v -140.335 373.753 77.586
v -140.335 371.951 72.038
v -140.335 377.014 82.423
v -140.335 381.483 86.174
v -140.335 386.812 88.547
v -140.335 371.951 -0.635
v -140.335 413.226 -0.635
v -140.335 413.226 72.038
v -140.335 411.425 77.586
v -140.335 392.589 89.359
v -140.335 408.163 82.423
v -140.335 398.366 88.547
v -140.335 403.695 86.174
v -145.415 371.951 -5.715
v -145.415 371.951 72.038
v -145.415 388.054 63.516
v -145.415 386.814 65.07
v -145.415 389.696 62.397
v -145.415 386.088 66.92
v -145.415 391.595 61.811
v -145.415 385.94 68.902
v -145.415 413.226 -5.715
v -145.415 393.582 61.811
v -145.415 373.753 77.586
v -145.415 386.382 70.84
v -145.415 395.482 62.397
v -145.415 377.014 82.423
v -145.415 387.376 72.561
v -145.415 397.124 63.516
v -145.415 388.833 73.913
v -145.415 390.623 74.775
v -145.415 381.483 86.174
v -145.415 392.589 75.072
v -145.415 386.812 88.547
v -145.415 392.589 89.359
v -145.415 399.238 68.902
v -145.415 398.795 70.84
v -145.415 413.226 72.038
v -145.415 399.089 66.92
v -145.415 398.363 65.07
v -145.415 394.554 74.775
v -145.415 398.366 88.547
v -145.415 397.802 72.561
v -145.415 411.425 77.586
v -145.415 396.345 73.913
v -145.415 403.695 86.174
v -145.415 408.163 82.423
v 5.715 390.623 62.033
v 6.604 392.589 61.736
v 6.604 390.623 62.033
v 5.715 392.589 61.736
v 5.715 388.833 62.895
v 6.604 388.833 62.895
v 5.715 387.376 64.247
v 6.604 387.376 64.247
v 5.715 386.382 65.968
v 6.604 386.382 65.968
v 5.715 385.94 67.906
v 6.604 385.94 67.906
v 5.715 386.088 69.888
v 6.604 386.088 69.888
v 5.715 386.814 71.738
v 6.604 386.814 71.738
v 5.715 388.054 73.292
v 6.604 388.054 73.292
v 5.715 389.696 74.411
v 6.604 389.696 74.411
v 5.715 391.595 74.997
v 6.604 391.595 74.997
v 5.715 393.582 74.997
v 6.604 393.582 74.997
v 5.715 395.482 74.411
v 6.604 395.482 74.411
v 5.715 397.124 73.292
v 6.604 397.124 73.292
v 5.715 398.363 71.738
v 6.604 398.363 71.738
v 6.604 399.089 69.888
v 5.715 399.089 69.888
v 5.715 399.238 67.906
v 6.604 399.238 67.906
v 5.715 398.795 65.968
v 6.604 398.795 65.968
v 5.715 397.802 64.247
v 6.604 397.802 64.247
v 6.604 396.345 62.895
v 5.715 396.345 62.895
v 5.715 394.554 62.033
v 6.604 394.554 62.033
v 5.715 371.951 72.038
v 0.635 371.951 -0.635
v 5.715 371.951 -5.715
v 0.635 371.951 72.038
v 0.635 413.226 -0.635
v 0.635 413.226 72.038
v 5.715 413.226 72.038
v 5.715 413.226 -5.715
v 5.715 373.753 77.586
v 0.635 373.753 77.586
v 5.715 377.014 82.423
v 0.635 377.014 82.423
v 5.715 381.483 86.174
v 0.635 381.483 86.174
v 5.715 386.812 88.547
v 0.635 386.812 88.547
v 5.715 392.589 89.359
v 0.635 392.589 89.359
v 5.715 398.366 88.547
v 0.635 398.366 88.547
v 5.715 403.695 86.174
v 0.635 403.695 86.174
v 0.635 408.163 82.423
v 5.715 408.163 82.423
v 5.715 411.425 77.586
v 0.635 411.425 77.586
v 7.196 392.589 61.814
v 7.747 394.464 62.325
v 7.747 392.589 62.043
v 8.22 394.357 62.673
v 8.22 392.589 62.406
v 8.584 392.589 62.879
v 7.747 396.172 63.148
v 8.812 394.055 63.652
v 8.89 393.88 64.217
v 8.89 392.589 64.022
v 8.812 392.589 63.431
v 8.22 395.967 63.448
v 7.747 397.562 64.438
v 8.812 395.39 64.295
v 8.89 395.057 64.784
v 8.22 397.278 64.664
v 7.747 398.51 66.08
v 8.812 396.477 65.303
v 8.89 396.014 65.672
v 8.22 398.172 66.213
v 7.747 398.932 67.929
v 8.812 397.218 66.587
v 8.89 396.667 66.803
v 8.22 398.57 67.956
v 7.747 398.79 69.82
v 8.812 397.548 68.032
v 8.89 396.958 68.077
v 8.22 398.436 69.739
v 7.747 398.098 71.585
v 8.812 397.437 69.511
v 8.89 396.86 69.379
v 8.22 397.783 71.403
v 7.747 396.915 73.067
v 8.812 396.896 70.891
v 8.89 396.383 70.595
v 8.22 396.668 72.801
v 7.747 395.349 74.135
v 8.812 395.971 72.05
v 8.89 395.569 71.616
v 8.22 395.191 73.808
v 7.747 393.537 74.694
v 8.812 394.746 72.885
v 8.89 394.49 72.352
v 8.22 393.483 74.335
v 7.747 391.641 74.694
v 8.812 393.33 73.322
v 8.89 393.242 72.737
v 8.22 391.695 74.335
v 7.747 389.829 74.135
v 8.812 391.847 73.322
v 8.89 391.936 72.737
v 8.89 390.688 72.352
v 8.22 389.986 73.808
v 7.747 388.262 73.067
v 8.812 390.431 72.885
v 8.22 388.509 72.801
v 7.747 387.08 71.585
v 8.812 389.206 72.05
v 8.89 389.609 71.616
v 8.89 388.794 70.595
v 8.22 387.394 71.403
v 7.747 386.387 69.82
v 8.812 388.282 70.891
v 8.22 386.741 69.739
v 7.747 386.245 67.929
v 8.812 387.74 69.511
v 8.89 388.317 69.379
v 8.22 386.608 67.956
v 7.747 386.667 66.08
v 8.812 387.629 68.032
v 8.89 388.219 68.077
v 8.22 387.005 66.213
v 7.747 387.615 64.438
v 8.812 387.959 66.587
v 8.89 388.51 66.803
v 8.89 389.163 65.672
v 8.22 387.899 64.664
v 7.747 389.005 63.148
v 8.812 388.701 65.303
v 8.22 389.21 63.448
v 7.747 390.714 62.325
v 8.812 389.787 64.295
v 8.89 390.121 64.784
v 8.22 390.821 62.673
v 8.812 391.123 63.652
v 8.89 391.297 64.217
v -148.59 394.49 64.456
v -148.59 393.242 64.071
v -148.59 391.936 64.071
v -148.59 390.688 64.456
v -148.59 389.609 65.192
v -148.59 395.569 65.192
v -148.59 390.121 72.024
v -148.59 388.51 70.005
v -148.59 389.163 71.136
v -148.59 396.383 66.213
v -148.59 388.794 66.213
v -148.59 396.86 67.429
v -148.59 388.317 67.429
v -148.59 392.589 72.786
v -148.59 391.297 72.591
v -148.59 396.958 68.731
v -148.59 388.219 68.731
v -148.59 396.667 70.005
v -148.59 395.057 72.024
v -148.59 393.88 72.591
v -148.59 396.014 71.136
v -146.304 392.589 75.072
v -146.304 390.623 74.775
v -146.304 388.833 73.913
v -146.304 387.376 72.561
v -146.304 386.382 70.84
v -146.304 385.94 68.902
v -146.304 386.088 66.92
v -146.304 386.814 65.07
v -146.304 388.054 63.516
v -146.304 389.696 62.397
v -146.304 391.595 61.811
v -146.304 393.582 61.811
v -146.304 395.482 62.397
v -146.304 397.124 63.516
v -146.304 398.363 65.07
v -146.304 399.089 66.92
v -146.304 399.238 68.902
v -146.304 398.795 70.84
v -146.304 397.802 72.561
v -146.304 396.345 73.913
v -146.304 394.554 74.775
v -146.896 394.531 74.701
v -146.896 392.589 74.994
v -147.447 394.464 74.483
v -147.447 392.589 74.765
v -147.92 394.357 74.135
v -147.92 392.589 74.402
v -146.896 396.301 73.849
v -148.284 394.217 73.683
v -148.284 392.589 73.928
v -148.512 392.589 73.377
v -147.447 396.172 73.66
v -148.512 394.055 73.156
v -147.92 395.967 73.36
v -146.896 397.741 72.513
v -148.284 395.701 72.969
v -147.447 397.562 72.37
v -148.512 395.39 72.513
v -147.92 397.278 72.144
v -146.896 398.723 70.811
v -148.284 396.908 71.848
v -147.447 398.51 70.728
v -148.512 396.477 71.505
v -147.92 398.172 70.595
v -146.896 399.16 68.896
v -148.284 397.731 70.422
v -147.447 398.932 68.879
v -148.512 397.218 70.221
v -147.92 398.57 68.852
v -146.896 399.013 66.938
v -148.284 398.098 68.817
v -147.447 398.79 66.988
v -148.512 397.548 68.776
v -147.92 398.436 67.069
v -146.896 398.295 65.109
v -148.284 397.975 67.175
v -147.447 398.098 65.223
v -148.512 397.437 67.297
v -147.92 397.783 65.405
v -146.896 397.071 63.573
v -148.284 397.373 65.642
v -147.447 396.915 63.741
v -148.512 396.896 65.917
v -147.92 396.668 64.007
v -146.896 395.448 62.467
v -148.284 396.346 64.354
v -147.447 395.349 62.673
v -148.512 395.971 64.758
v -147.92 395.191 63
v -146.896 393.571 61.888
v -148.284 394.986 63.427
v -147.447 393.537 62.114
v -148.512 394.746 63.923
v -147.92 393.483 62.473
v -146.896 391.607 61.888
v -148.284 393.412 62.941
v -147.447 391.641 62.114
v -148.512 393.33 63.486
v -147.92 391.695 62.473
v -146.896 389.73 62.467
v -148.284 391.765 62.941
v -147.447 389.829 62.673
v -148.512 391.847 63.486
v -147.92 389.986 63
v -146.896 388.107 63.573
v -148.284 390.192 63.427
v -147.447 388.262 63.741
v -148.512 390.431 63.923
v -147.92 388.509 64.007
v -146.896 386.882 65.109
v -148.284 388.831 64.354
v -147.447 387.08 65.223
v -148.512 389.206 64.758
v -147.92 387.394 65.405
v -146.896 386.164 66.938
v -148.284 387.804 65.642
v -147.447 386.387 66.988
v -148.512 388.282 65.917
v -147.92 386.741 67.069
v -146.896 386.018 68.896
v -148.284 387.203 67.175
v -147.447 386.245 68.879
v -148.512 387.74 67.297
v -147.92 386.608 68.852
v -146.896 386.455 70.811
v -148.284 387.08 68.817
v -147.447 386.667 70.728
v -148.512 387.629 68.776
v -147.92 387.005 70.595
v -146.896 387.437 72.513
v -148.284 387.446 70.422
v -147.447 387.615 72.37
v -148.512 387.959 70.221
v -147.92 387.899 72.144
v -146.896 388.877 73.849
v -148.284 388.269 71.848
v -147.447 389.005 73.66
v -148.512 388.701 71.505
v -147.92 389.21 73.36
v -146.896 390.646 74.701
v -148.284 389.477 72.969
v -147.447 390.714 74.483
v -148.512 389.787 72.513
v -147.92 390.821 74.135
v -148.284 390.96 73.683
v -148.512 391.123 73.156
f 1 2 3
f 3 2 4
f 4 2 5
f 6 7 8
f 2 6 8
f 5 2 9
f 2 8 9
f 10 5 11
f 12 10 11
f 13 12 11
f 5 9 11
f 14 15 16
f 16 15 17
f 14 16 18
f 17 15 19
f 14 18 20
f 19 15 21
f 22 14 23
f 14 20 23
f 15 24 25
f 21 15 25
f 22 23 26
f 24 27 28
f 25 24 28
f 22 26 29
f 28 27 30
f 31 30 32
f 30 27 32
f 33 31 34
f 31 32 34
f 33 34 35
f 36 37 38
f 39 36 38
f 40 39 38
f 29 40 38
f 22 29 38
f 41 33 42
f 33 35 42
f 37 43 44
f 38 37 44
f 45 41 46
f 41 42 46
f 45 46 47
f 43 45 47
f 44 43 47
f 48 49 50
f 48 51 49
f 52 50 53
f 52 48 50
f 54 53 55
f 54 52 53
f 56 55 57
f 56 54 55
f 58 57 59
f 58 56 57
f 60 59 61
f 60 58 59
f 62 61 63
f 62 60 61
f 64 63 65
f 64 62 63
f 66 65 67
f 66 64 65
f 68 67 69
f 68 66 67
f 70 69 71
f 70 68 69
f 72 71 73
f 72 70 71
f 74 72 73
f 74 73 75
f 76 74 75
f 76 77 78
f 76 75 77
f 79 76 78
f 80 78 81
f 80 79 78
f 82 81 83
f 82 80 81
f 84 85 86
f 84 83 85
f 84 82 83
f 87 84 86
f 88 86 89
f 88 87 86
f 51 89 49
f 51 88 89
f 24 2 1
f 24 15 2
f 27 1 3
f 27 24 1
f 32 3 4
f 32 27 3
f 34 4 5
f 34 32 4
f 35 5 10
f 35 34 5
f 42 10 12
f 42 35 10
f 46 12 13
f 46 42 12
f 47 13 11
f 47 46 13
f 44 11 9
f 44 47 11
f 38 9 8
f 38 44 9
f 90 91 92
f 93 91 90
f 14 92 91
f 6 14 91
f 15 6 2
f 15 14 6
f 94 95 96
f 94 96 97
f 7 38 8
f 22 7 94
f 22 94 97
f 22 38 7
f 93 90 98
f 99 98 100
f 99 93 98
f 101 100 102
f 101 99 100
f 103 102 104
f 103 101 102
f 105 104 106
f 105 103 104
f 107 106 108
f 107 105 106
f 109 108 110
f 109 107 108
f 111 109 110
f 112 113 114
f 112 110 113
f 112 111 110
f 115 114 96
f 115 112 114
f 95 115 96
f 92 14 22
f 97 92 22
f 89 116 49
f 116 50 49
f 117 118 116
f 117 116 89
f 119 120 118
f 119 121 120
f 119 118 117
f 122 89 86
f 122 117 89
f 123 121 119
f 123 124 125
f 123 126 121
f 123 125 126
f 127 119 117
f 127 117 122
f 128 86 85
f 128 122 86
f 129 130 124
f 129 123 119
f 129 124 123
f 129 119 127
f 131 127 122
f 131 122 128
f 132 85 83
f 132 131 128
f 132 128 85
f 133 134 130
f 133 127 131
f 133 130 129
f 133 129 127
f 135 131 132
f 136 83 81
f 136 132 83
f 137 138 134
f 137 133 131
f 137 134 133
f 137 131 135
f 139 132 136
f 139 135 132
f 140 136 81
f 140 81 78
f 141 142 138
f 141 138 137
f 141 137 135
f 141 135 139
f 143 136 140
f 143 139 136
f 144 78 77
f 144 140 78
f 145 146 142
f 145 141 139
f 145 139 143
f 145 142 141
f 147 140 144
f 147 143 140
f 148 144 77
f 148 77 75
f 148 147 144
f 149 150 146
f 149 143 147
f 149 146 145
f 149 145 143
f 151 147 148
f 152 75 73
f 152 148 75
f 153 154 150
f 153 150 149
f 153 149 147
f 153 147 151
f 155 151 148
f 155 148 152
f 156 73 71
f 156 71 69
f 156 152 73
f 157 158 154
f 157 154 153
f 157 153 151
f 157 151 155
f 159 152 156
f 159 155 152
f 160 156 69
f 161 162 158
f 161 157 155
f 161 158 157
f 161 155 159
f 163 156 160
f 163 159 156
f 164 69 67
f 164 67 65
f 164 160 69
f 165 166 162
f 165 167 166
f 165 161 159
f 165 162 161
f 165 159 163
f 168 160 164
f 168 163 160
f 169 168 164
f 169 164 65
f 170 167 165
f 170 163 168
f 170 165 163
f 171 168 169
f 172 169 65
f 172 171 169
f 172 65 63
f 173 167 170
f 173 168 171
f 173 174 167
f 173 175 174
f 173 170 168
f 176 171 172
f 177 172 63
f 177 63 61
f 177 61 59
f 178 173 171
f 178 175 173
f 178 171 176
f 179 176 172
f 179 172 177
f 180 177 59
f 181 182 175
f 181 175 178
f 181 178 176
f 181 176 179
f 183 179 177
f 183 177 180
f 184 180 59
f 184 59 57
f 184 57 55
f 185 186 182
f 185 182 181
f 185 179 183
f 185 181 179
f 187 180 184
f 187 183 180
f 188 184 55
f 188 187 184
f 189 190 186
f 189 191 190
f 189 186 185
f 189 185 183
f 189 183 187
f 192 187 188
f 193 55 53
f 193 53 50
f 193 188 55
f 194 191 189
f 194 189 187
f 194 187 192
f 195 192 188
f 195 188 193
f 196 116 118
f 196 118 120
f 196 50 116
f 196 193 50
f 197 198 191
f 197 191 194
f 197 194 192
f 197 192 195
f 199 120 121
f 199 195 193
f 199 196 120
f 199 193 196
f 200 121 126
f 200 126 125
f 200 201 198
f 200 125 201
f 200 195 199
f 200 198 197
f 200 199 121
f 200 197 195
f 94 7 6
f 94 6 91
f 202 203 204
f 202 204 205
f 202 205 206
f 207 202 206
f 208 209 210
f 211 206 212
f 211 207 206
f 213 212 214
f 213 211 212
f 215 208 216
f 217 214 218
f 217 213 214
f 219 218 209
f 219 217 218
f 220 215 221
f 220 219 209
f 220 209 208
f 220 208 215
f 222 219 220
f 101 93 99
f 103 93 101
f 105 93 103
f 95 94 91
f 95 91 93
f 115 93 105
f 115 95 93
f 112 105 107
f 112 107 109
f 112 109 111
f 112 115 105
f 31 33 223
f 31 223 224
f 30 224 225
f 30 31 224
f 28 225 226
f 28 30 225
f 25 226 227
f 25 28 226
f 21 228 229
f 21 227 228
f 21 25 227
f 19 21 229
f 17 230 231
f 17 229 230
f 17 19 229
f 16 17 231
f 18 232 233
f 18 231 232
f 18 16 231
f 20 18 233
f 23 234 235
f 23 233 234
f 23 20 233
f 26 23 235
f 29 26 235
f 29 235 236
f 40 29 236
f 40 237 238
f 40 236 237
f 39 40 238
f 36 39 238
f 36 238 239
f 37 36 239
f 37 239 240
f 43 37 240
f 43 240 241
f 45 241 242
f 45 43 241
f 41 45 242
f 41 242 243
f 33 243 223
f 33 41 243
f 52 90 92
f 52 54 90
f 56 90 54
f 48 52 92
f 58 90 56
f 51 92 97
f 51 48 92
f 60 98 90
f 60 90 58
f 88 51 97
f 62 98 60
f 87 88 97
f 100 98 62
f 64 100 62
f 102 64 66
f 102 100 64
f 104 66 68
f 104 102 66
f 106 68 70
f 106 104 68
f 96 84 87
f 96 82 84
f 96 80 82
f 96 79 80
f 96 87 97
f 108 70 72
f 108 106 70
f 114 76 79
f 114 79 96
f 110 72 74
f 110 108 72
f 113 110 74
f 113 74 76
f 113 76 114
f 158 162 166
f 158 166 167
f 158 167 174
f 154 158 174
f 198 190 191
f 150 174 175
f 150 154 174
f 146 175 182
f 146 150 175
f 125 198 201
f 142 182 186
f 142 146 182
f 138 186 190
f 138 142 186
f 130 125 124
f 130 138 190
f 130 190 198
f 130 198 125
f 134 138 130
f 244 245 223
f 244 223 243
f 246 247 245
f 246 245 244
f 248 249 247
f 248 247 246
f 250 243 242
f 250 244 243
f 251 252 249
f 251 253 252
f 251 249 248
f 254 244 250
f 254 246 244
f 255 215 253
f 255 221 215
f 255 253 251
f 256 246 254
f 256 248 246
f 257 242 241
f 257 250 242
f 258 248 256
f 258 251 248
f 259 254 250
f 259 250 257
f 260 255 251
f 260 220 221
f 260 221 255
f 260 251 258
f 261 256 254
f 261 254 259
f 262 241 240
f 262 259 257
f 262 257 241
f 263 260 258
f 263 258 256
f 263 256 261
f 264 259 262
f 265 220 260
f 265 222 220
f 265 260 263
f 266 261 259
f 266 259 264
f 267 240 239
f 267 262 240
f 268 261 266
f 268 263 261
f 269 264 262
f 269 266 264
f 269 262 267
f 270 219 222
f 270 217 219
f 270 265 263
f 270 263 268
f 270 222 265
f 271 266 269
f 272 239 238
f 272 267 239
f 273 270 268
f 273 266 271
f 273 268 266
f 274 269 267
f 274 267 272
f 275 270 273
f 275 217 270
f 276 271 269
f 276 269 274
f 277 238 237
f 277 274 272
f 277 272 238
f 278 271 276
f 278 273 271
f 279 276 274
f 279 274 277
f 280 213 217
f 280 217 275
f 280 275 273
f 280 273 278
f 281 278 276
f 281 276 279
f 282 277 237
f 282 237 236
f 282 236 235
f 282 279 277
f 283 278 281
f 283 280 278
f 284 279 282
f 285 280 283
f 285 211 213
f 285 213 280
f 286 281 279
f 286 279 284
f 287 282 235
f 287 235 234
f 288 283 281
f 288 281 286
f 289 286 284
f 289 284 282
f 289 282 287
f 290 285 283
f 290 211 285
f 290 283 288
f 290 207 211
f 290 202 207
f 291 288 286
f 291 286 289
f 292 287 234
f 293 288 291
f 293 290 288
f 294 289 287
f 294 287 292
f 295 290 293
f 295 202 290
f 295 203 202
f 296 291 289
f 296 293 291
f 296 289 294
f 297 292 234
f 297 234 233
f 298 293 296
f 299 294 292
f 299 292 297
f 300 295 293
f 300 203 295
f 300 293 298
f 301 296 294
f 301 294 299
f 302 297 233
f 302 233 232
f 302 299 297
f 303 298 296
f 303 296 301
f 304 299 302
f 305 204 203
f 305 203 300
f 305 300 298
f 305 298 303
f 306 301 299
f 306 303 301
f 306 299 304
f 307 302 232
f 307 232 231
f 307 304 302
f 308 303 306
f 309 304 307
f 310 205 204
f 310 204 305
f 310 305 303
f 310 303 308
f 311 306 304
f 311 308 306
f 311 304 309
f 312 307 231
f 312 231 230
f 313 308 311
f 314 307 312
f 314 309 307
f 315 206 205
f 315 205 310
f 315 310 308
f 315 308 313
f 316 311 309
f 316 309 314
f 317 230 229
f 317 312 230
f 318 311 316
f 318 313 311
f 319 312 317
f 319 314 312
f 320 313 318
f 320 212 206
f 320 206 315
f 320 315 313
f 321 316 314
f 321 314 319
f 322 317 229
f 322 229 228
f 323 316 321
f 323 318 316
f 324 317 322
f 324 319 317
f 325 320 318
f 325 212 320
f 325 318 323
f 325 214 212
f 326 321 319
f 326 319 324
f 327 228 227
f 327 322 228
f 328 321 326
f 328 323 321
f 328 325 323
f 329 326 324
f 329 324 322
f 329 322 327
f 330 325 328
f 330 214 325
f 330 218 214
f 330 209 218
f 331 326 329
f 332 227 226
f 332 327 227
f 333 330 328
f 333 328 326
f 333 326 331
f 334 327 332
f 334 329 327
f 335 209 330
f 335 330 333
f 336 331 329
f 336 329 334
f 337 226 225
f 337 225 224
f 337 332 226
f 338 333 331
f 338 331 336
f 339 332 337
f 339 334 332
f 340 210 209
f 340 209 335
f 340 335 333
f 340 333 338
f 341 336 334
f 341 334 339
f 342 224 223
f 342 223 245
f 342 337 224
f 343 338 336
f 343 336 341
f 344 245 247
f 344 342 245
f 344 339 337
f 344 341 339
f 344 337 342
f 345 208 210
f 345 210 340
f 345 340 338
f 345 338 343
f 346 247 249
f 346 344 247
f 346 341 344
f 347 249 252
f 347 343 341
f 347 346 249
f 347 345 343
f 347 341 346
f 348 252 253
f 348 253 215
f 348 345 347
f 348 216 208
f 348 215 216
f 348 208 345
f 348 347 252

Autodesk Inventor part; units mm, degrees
ref_plane "YZ Plane" through (0, 0, 0) normal (1, 0, 0) x (0, 1, 0)
ref_plane "XZ Plane" through (0, 0, 0) normal (0, 1, 0) x (-1, 0, 0)
ref_plane "XY Plane" through (0, 0, 0) normal (0, 0, 1) x (1, 0, 0)
sketch "Sketch1" plane through (0, 0, 0) normal (1, 0, 0) x (0, 1, 0)
  line L0 (920.75, 0) -> (0, 0)
  line L1 (0, 0) -> (920.75, 0)
  line L2 (-297.6389, 409.8513) -> (2710.7909, 409.8513) construction
  line L3 (2710.7909, 409.8513) -> (2710.7909, -1716.9746) construction
  line L4 (2710.7909, -1716.9746) -> (-297.6389, -1716.9746) construction
  line L5 (-297.6389, -1716.9746) -> (-297.6389, 409.8513) construction
  line L6 (0, 0) -> (920.75, 0)
  line L7 (920.75, 0) -> (920.75, 100.33)
  line L8 (0, 100.33) -> (920.75, 100.33)
  line L9 (0, 0) -> (0, 100.33)
  line L10 (0, 100.33) -> (0, 120.65)
  line L11 (0, 120.65) -> (920.75, 120.65)
  line L12 (920.75, 120.65) -> (920.75, 100.33)
  line L13 (0, 120.65) -> (0, 196.85)
  line L14 (920.75, 196.85) -> (920.75, 120.65)
  line L15 (477.9962, 0) -> (477.9962, -13.97)
  line L16 (477.9962, -13.97) -> (434.8162, -13.97)
  line L17 (434.8162, -13.97) -> (434.8162, 0)
  line L18 (133.294, 0) -> (133.294, -13.97)
  line L19 (133.294, -13.97) -> (90.114, -13.97)
  line L20 (90.114, -13.97) -> (90.114, 0)
  line L21 (769.0257, 0) -> (769.0257, -13.97)
  line L22 (769.0257, -13.97) -> (812.2057, -13.97)
  line L23 (812.2057, -13.97) -> (812.2057, 0)
  line L24 (434.8162, -13.97) -> (477.9962, -13.97)
  line L25 (769.0257, -13.97) -> (812.2057, -13.97)
  line L26 (90.114, -13.97) -> (133.294, -13.97)
  line L27 (90.114, -13.97) -> (111.704, -13.97)
  line L28 (111.704, -13.97) -> (100.909, -13.97)
  line L29 (100.909, -13.97) -> (122.499, -13.97)
  line L30 (122.499, -13.97) -> (122.499, -33.02)
  line L31 (122.499, -33.02) -> (100.909, -33.02)
  line L32 (100.909, -33.02) -> (100.909, -13.97)
  line L33 (434.8162, -13.97) -> (456.4062, -13.97)
  line L34 (456.4062, -13.97) -> (445.6112, -13.97)
  line L35 (445.6112, -13.97) -> (467.2012, -13.97)
  line L36 (467.2012, -13.97) -> (467.2012, -33.02)
  line L37 (467.2012, -33.02) -> (445.6112, -33.02)
  line L38 (445.6112, -33.02) -> (445.6112, -13.97)
  line L39 (769.0257, -13.97) -> (790.6157, -13.97)
  line L40 (790.6157, -13.97) -> (779.8207, -13.97)
  line L41 (779.8207, -13.97) -> (801.4107, -13.97)
  line L42 (801.4107, -13.97) -> (801.4107, -33.02)
  line L43 (801.4107, -33.02) -> (779.8207, -33.02)
  line L44 (779.8207, -33.02) -> (779.8207, -13.97)
  line L45 (434.8162, 0) -> (413.2262, 0)
  line L46 (413.2262, 0) -> (413.2262, -11.43)
  line L47 (413.2262, -11.43) -> (371.9512, -11.43)
  line L48 (371.9512, -11.43) -> (371.9512, 64.77)
  arc A0 (413.2262, 72.0379) -> (371.9512, 72.0379) centre (392.5887, 68.404) ccw
  line L49 (413.2262, 0) -> (413.2262, 64.77)
  line L50 (371.9512, 64.77) -> (371.9512, 72.0379)
  line L51 (413.2262, 64.77) -> (413.2262, 72.0379)
  line L52 (434.8162, -13.97) -> (434.8162, 202.565)
  line L53 (477.9962, -13.97) -> (477.9962, 202.565)
  line L54 (769.0257, -13.97) -> (769.0257, 202.565)
  line L55 (812.2057, -13.97) -> (812.2057, 202.565)
  line L56 (812.2057, 202.565) -> (769.0257, 202.565)
  line L57 (477.9962, 202.565) -> (434.8162, 202.565)
  line L58 (133.294, -13.97) -> (133.294, 182.245)
  line L59 (90.114, -13.97) -> (90.114, 182.245)
  line L60 (90.114, 182.245) -> (133.294, 182.245)
  line L61 (67.3834, 182.245) -> (164.6776, 182.245)
  line L62 (413.2262, 202.565) -> (508.4774, 202.565)
  line L63 (745.5808, 202.565) -> (847.3717, 202.565)
  line L64 (67.3834, 161.925) -> (164.6776, 161.925)
  line L65 (413.2262, 182.245) -> (508.4774, 182.245)
  line L66 (745.5808, 182.245) -> (847.3717, 182.245)
  line L67 (133.294, -13.97) -> (133.294, 78.74)
  line L68 (133.294, 78.74) -> (434.8162, 78.74)
  line L69 (133.294, -13.97) -> (133.294, 26.67)
  line L70 (133.294, 26.67) -> (371.9512, 26.67)
  line L71 (133.294, 26.67) -> (298.394, 26.67)
  line L72 (298.394, 26.67) -> (317.7759, 78.74)
  line L73 (133.294, 78.74) -> (133.294, 59.055)
  line L74 (133.294, 59.055) -> (310.4486, 59.055)
  line L75 (371.9512, 0) -> (371.9512, -5.715)
  line L76 (371.9512, -5.715) -> (413.2262, -5.715)
  dimension "d0" = 920.75
  dimension "d1" = 20.32
  dimension "d2" = 76.2
  dimension "d3" = 13.97
  dimension "d4" = 43.18
  dimension "d5" = 13.97
  dimension "d6" = 43.18
  dimension "d7" = 13.97
  dimension "d8" = 13.97
  dimension "d9" = 43.18
  dimension "d10" = 21.59
  dimension "d11" = 19.05
  dimension "d12" = 21.59
  dimension "d13" = 19.05
  dimension "d14" = 21.59
  dimension "d15" = 19.05
  dimension "d16" = 21.59
  dimension "d17" = 11.43
  dimension "d18" = 41.275
  dimension "d19" = 76.2
  dimension "d20" = 20.955
  dimension "d21" = 216.535
  dimension "d22" = 216.535
  dimension "d23" = 216.535
  dimension "d24" = 216.535
  dimension "d25" = 196.215
  dimension "d26" = 20.32
  dimension "d27" = 20.32
  dimension "d28" = 20.32
  dimension "d29" = 92.71
  dimension "d30" = 40.64
  dimension "d31" = 165.1
  dimension "d32" = 19.685
extrude "Extrusion1" add sketch "Sketch1" along normal blind 5.715 and the other way blind 145.415 contours L46 L76 L48 L0 | L0 L48 L50 A0 L68 L51 L49 | L68 A0
sketch "Sketch2" plane through (-145.415, 413.2262, 72.0379) normal (0, 1, 0) x (1, 0, 0)
  line L0 (0, 0) -> (151.13, 0) projected
  line L1 (151.13, 77.7529) -> (151.13, 0) projected
  line L2 (0, 77.7529) -> (151.13, 77.7529) projected
  line L3 (0, 0) -> (0, 77.7529) projected
  line L4 (144.145, 70.7679) -> (144.145, 6.985)
  line L5 (144.145, 6.985) -> (6.985, 6.985)
  line L6 (6.985, 6.985) -> (6.985, 70.7679)
  line L7 (6.985, 70.7679) -> (144.145, 70.7679)
  line L8 (146.05, 72.6729) -> (146.05, 5.08)
  line L9 (146.05, 5.08) -> (5.08, 5.08)
  line L10 (5.08, 5.08) -> (5.08, 72.6729)
  line L11 (5.08, 72.6729) -> (146.05, 72.6729)
  line L12 (146.05, 5.08) -> (146.05, -20.9448)
  line L13 (146.05, 5.08) -> (172.0748, 5.08) construction
  line L14 (5.08, 5.08) -> (5.08, -29.2393)
  line L15 (5.08, -29.2393) -> (146.05, -20.9448)
  point P0 (145.415, 72.0379)
  dimension "d39" = 6.985
  dimension "d40" = 1.905
  dimension "d41" = 90
extrude "Extrusion2" cut sketch "Sketch2" against normal through all contours L14 L9 L12 L0 | L0 L12 L15 L14 | L10 L11 L8 L9 | L4 L5 L6 L7
sketch "Sketch3" plane through (5.715, 0, 0) normal (1, 0, 0) x (0, 0, -1)
  arc A0 (-72.0379, 413.2262) -> (-72.0379, 371.9512) centre (-68.404, 392.5887) ccw projected
  circle A1 centre (-68.404, 392.5887) radius 6.6675
  point P0 (0, 0)
  dimension "d44" = 13.335
sketch "Sketch4" plane through (-145.415, 0, 0) normal (-1, 0, 0) x (0, 0, 1)
  circle A0 centre (68.404, 392.5887) radius 6.6675 projected
  circle A1 centre (68.404, 392.5887) radius 6.6675
  point P0 (0, 0)
extrude "Extrusion3" add sketch "Sketch4" along normal blind 3.175
extrude "Extrusion4" add sketch "Sketch3" along normal blind 3.175
fillet "Fillet1" radius 2.286 2 edges at (8.89, 392.5887, 75.0715) (-148.59, 392.5887, 61.7365)
sketch "Sketch5" plane through (5.715, 0, 0) normal (1, 0, 0) x (0, 0, -1)
  arc A0 (-72.0379, 413.2262) -> (-72.0379, 371.9512) centre (-68.404, 392.5887) ccw projected
  line L0 (-89.359, 392.5887) -> (-89.359, 351.6635)
  line L1 (5.715, 371.9512) -> (5.715, 413.2262) projected
  line L2 (-72.0379, 371.9512) -> (5.715, 371.9512) projected
  line L3 (5.715, 413.2262) -> (-72.0379, 413.2262) projected
  point P0 (0, 0)
  dimension "d50" = 95.0739
  dimension "d51" = 41.275
sketch "Sketch6" plane through (5.715, 413.2262, -5.715) normal (0, 0, -1) x (-1, 0, 0)
  line L0 (154.305, -16.256) -> (154.305, -25.019) projected
  line L1 (-3.175, -25.019) -> (-3.175, -16.256) projected
  point P0 (5.715, -413.2262)
  dimension "d52" = 157.48
properties part number "small side peice"
